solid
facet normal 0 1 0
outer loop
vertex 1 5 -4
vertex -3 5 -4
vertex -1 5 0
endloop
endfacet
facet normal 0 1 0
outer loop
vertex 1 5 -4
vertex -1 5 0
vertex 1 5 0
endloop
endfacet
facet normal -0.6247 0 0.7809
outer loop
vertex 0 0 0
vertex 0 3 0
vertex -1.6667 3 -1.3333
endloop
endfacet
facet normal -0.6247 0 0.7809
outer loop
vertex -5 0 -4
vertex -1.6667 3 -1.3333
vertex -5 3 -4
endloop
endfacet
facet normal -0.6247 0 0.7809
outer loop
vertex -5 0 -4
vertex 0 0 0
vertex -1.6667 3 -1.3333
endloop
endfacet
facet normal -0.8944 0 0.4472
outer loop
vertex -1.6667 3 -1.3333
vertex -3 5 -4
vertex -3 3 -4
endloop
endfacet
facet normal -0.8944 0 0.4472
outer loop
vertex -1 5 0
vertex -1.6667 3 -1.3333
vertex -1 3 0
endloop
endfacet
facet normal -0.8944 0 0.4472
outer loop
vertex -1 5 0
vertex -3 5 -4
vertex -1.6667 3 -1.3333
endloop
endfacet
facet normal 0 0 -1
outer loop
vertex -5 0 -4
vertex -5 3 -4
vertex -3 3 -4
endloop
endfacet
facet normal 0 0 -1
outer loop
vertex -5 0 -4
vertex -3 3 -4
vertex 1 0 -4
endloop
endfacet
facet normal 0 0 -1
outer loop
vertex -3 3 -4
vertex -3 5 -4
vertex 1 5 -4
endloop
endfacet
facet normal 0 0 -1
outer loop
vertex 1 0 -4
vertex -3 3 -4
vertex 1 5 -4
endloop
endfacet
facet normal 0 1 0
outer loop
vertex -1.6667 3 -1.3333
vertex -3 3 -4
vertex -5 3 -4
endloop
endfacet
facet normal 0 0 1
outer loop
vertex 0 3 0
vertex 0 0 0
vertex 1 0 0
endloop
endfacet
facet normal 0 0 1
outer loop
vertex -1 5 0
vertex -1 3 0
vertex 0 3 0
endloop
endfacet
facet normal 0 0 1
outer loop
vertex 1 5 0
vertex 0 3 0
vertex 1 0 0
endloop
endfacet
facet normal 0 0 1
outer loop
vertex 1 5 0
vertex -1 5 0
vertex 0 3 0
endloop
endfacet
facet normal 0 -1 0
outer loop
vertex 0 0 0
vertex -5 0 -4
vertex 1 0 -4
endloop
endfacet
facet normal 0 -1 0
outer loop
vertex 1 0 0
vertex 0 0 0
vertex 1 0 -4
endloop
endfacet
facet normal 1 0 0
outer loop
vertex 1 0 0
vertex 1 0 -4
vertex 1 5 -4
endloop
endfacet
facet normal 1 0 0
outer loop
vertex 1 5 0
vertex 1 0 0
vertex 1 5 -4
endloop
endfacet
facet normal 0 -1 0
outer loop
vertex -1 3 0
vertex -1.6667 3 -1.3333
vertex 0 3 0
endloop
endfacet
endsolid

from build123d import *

# Parameters (mm, degrees)
BOSS_EXTRUDE1_DEPTH = 3
BOSS_EXTRUDE2_DEPTH = 4
CUT_EXTRUDE2_DEPTH  = 2


with BuildPart() as part:
    # Sketch1 → Boss-Extrude1 (new body)
    with BuildSketch(Plane(origin=(0, 0, 0), x_dir=(1, 0, 0), z_dir=(0, 1, 0))):
        Polygon((0, 0), (-5, 4), (0, 4), align=None)
    extrude(amount=BOSS_EXTRUDE1_DEPTH)

    # Sketch2 → Boss-Extrude2 (add)
    with BuildSketch(Plane(origin=(0, 0, -4), x_dir=(-1, 0, 0), z_dir=(0, 0, -1))):
        Polygon((1, 5), (3, 5), (3, 3), (0, 3), (0, 0), (-1, 0), (-1, 5), align=None)
    extrude(amount=-BOSS_EXTRUDE2_DEPTH)

    # Sketch4 → Cut-Extrude2 (cut)
    with BuildSketch(Plane(origin=(0, 5, 0), x_dir=(1, 0, 0), z_dir=(0, 1, 0))):
        Polygon((-3, 4), (-1, 0), (-3, 0), align=None)
    extrude(amount=-CUT_EXTRUDE2_DEPTH, mode=Mode.SUBTRACT)


solid = part.part
